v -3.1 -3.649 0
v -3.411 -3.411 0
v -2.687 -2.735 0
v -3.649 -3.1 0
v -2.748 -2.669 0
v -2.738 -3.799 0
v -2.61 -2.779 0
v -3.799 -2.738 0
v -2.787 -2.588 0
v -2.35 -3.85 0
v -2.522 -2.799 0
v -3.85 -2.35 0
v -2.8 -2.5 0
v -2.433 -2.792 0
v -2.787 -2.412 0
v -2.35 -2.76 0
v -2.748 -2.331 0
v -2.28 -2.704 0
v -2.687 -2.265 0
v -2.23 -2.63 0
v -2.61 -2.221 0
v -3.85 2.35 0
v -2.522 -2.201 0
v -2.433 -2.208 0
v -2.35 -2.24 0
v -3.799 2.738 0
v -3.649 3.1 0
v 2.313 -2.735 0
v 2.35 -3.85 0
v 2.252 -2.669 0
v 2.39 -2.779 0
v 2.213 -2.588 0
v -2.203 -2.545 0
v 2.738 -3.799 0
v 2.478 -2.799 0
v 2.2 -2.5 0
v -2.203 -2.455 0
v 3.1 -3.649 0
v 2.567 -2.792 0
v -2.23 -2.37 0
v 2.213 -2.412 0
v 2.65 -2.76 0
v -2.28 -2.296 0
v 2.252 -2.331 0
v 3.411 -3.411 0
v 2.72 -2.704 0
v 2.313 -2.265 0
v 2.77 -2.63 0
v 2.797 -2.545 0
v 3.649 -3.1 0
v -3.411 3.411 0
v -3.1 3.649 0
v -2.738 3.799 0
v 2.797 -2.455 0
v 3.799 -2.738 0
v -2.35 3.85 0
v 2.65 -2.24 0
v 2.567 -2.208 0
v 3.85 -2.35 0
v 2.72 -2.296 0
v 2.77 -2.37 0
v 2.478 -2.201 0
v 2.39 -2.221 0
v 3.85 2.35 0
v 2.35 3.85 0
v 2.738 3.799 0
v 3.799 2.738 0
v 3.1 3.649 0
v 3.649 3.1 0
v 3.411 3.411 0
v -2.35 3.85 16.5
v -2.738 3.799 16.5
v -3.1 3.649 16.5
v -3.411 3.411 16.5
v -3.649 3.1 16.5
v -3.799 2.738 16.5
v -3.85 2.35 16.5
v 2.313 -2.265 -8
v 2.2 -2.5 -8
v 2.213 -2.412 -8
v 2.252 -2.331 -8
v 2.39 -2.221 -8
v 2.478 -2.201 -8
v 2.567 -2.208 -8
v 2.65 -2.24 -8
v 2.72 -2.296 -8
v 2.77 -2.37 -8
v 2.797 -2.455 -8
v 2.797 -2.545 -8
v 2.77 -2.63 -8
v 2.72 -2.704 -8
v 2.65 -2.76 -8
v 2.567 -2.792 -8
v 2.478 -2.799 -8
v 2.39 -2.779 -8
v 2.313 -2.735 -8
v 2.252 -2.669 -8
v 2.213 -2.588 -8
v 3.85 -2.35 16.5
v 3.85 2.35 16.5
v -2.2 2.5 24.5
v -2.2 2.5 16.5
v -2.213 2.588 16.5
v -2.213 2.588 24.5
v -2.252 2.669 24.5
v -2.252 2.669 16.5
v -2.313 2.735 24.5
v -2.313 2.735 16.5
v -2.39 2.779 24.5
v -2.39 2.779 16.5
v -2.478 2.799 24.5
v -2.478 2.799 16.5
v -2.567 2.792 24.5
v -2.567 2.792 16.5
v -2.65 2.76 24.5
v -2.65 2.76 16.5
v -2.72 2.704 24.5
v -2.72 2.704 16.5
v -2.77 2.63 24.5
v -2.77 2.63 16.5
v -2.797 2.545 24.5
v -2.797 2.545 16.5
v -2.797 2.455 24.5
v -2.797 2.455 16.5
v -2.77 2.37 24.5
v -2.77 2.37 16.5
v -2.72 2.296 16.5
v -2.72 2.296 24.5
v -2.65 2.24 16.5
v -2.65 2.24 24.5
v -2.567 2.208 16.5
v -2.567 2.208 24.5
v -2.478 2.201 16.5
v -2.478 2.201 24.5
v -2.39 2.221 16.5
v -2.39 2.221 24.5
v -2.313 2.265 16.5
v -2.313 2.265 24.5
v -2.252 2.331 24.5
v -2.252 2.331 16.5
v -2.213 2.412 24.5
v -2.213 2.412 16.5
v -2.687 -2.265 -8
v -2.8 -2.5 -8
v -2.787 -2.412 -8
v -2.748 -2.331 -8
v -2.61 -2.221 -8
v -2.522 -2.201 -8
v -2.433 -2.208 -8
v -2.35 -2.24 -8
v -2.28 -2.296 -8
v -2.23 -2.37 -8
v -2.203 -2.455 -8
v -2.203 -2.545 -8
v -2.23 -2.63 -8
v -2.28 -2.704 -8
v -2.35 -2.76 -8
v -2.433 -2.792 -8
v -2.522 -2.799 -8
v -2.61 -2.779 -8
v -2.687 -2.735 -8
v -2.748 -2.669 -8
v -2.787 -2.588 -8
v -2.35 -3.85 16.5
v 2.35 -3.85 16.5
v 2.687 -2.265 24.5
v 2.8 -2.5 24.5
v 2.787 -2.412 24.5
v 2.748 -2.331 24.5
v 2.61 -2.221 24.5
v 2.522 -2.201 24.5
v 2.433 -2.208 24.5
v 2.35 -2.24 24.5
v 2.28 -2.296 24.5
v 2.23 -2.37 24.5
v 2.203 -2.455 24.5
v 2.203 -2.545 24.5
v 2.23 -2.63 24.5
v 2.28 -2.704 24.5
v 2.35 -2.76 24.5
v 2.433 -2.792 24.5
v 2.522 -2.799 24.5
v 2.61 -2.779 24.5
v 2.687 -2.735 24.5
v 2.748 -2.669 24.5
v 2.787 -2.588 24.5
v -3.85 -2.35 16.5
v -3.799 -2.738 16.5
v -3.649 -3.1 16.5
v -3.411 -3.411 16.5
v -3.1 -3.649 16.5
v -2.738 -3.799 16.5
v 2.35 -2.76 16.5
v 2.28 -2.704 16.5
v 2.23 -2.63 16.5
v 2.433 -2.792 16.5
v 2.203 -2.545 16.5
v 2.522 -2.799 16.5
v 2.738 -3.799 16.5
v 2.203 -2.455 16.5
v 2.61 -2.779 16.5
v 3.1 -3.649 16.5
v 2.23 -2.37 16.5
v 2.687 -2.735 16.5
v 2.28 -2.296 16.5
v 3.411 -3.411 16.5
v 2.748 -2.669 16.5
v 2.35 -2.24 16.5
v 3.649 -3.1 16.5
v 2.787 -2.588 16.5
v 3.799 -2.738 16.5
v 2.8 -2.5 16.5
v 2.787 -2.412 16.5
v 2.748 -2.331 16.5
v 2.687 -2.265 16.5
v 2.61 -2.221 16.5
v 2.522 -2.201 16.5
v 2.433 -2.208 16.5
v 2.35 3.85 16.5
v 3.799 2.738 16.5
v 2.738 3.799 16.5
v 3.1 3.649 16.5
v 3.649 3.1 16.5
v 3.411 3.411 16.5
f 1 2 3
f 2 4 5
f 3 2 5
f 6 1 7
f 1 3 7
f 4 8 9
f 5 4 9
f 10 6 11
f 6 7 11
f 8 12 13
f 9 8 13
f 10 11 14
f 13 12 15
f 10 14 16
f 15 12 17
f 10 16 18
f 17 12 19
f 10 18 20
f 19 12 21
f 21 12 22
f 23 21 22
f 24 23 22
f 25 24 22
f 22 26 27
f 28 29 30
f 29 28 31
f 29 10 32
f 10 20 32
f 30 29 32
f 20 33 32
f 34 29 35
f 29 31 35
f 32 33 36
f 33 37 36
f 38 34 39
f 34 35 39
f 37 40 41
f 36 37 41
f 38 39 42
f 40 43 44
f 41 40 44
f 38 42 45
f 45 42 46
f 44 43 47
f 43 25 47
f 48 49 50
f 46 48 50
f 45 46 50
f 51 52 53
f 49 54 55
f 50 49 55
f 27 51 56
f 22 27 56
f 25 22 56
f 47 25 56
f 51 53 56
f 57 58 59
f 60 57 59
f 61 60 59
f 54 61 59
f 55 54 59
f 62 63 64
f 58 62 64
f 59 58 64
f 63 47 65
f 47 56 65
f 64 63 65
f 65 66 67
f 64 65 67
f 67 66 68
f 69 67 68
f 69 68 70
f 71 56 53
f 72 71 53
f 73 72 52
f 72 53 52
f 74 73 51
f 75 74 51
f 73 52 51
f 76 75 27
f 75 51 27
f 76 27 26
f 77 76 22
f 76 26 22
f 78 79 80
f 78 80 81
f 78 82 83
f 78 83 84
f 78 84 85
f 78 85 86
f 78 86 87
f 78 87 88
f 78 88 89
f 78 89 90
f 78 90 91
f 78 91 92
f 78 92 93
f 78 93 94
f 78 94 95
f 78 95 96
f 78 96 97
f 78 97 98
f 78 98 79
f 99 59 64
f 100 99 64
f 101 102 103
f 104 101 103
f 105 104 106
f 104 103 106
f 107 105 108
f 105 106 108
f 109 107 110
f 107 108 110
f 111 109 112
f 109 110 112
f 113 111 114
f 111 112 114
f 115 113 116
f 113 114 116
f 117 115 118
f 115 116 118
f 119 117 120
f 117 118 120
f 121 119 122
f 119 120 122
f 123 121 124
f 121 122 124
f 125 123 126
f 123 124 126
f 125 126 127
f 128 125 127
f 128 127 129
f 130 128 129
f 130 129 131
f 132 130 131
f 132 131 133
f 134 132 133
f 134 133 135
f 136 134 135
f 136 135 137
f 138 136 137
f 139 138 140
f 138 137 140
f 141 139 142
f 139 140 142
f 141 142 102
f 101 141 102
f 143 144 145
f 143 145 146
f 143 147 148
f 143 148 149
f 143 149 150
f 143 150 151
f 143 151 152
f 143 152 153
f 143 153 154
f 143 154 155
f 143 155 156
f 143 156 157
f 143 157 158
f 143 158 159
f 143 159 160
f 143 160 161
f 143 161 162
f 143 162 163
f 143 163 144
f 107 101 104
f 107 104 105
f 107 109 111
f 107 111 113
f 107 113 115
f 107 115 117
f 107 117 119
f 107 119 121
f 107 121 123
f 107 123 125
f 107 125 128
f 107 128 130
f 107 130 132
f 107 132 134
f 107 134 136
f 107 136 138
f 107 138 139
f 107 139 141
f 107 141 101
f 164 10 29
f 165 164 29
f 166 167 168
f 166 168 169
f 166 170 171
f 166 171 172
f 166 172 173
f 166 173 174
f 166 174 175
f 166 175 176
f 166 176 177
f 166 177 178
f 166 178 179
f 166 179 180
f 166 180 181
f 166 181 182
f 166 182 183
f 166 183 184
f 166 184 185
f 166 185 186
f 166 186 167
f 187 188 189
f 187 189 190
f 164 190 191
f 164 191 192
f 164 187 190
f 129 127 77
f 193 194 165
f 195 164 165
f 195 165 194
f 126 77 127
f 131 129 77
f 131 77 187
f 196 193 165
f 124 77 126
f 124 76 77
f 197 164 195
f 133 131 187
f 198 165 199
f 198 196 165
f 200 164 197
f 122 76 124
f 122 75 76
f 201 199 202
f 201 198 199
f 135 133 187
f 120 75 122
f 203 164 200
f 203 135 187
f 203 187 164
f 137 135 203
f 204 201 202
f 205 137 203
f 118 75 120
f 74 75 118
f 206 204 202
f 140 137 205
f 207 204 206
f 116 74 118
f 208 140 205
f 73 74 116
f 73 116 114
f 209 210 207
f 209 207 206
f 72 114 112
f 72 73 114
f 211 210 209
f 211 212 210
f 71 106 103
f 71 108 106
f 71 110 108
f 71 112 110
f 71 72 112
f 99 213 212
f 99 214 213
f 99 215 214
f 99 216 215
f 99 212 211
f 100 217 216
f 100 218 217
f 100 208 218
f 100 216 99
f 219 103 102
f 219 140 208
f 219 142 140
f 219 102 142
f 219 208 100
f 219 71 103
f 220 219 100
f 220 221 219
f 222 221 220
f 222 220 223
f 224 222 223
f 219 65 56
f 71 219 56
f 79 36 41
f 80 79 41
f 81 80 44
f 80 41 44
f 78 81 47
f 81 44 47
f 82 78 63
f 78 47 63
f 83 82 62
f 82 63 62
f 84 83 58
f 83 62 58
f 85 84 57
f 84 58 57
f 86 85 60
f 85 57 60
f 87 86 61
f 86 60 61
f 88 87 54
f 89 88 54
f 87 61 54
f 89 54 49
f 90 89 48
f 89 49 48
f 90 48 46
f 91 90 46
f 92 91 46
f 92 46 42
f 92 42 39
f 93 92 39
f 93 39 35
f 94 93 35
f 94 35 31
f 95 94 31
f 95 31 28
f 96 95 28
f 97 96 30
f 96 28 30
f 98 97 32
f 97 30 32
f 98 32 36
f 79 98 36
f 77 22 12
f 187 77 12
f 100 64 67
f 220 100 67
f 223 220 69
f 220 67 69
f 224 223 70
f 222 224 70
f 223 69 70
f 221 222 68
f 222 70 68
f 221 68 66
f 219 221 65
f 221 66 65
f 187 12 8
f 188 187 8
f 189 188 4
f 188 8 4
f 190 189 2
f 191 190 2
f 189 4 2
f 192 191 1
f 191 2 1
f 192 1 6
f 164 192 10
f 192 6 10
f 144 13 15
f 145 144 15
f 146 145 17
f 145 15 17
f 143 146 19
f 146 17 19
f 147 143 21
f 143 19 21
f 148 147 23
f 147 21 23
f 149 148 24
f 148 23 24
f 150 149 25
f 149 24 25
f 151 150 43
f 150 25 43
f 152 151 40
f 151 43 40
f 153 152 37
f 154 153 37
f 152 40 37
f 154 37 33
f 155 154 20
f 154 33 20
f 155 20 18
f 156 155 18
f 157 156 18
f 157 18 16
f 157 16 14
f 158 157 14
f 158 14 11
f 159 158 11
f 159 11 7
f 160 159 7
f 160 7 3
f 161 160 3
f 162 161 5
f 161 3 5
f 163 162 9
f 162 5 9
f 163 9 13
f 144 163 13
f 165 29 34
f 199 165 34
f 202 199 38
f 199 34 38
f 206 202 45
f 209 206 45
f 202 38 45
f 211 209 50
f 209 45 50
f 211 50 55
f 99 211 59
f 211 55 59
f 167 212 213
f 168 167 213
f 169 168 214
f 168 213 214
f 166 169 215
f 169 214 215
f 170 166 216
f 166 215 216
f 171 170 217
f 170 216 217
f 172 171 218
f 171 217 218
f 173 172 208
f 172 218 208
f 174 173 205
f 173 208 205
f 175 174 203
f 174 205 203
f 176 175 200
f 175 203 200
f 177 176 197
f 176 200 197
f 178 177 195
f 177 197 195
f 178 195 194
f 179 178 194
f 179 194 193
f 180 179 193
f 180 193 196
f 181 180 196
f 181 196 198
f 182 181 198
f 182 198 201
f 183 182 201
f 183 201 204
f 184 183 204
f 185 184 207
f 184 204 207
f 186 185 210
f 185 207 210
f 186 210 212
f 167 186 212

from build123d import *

# Parameters (mm, degrees)
EXTRUDE_1_DEPTH = 16.5
SKETCH_2_R      = 0.3
EXTRUDE_2_DEPTH = 8
SKETCH_3_R      = 0.3
EXTRUDE_3_DEPTH = 8


with BuildPart() as part:
    # Эскиз1 → Бобышка-Вытянуть1 (new body)
    with BuildSketch(Plane.XY):
        with BuildLine():
            Line((-2.35, -3.85), (2.35, -3.85))
            ThreePointArc((2.35, -3.85), (3.410660172, -3.410660172), (3.85, -2.35))
            Line((3.85, -2.35), (3.85, 2.35))
            ThreePointArc((3.85, 2.35), (3.410660172, 3.410660172), (2.35, 3.85))
            Line((2.35, 3.85), (-2.35, 3.85))
            ThreePointArc((-2.35, 3.85), (-3.410660172, 3.410660172), (-3.85, 2.35))
            Line((-3.85, 2.35), (-3.85, -2.35))
            ThreePointArc((-3.85, -2.35), (-3.410660172, -3.410660172), (-2.35, -3.85))
        make_face()
    extrude(amount=EXTRUDE_1_DEPTH)

    # Эскиз2 → Бобышка-Вытянуть2 (add)
    with BuildSketch(Plane(origin=(0, 0, 0), x_dir=(-1, 0, 0), z_dir=(0, 0, -1))):
        with Locations((-2.5, -2.5)):
            Circle(SKETCH_2_R)
        with Locations((2.5, -2.5)):
            Circle(SKETCH_2_R)
    extrude(amount=EXTRUDE_2_DEPTH)

    # Эскиз3 → Бобышка-Вытянуть3 (add)
    with BuildSketch(Plane.XY.offset(16.5)):
        with Locations((2.5, -2.5)):
            Circle(SKETCH_3_R)
        with Locations((-2.5, 2.5)):
            Circle(SKETCH_3_R)
    extrude(amount=EXTRUDE_3_DEPTH)


solid = part.part
